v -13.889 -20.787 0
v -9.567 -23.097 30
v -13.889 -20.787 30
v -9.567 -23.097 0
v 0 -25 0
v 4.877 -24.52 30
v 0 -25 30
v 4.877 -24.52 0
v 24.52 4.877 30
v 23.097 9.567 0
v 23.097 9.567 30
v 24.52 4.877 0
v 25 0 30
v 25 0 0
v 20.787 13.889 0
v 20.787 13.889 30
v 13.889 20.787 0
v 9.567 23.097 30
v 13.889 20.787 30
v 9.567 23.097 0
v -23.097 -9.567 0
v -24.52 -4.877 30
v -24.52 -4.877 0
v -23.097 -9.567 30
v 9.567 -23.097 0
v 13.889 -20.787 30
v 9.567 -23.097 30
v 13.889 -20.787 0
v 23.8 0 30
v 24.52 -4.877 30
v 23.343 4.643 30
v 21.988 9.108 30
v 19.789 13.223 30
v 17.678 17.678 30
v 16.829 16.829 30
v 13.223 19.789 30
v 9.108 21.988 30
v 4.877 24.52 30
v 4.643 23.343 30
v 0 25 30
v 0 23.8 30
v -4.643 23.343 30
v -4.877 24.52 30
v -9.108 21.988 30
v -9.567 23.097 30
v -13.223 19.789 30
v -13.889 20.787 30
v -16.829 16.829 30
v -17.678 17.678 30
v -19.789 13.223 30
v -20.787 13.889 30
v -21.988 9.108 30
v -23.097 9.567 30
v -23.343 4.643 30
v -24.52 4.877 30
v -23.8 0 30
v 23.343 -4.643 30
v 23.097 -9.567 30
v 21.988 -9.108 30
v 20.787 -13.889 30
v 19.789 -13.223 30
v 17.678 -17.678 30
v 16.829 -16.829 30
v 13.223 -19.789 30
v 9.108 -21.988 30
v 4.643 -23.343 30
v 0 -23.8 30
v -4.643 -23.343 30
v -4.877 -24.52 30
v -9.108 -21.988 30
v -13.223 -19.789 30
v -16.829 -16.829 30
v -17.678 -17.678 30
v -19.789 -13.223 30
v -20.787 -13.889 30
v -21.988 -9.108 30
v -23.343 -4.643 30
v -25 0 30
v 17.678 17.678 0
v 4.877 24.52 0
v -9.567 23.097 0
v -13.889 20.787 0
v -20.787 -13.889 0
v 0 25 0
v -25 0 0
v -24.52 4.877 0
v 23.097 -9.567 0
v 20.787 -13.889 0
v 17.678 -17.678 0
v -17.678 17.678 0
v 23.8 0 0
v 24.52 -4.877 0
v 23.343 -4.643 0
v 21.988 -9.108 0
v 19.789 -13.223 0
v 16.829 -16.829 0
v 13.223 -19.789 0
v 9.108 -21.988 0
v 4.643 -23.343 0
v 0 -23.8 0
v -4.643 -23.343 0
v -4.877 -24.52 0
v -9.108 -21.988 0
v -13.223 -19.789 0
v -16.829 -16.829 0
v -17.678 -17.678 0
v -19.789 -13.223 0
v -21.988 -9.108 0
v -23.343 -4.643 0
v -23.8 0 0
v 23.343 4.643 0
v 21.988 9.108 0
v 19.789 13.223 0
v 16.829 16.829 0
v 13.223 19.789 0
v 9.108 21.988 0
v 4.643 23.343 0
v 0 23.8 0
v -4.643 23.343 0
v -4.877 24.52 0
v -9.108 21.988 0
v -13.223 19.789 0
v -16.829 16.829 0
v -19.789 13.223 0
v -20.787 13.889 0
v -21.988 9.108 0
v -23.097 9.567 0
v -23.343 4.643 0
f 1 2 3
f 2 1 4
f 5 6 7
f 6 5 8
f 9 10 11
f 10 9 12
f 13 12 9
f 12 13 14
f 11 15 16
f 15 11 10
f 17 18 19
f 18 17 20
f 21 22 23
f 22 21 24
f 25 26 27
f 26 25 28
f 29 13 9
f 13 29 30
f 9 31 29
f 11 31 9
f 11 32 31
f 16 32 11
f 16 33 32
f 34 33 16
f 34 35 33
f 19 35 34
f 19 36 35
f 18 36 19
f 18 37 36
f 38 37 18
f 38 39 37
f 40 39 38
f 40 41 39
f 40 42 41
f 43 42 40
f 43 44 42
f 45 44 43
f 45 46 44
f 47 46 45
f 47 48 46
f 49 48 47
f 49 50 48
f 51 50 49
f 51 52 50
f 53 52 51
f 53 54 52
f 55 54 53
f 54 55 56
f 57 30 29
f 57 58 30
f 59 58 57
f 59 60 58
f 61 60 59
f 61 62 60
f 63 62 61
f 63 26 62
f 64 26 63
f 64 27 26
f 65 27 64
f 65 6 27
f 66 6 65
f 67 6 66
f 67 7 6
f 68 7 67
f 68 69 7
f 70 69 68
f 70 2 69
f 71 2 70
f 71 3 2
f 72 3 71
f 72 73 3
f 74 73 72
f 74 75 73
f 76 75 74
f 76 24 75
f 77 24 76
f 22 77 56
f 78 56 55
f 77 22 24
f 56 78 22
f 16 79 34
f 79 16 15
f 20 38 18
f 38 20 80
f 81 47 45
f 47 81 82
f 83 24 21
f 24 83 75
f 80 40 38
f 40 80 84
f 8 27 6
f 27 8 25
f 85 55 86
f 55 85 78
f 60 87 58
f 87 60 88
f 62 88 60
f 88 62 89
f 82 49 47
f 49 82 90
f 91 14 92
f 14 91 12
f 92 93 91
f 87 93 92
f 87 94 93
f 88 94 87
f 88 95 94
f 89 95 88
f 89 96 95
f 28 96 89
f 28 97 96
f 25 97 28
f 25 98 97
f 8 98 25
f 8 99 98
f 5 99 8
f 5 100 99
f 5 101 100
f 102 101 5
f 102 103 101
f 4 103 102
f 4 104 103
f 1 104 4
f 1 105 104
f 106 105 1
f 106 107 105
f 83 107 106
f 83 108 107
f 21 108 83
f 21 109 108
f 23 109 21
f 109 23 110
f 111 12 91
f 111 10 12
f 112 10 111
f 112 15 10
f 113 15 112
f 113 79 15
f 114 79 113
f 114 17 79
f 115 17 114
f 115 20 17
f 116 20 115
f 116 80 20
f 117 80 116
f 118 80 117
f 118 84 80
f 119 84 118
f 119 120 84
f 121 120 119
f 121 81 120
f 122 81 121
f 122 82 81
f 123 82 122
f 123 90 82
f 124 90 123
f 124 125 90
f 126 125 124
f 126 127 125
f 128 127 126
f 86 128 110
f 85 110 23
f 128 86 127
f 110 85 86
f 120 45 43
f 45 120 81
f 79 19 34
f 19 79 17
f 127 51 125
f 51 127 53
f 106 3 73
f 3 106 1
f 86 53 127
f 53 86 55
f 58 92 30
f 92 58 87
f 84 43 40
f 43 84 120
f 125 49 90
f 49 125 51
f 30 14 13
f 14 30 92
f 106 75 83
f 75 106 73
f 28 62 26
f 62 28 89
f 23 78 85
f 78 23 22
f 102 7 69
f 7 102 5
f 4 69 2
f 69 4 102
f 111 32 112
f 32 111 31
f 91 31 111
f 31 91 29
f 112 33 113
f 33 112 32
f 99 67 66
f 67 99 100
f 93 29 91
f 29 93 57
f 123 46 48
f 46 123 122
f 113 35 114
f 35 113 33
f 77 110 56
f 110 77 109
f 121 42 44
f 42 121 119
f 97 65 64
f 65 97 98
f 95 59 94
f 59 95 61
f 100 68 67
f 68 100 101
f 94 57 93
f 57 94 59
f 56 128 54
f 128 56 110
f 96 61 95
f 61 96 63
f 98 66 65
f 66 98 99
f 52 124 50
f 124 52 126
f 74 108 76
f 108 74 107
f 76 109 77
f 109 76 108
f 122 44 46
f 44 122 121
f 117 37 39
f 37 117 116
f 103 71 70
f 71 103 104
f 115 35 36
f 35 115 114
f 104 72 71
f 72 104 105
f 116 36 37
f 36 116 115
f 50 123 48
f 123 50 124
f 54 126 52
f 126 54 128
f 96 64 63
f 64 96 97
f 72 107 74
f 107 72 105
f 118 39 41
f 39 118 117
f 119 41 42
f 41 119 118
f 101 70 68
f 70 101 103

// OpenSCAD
$fn = 32;

// ----------------------------------------------------------------------
// Thin tube: 1.2 mm wall
// ----------------------------------------------------------------------

// --- parameters (mm) ---
tube_od = 50;             // outer diameter
tube_h = 30;              // height, Z
wall = 1.2;               // wall thickness

difference() {
  cylinder(h = tube_h, d = tube_od);
  translate([0, 0, -1]) cylinder(h = tube_h + 2, d = tube_od - 2 * wall);
}
